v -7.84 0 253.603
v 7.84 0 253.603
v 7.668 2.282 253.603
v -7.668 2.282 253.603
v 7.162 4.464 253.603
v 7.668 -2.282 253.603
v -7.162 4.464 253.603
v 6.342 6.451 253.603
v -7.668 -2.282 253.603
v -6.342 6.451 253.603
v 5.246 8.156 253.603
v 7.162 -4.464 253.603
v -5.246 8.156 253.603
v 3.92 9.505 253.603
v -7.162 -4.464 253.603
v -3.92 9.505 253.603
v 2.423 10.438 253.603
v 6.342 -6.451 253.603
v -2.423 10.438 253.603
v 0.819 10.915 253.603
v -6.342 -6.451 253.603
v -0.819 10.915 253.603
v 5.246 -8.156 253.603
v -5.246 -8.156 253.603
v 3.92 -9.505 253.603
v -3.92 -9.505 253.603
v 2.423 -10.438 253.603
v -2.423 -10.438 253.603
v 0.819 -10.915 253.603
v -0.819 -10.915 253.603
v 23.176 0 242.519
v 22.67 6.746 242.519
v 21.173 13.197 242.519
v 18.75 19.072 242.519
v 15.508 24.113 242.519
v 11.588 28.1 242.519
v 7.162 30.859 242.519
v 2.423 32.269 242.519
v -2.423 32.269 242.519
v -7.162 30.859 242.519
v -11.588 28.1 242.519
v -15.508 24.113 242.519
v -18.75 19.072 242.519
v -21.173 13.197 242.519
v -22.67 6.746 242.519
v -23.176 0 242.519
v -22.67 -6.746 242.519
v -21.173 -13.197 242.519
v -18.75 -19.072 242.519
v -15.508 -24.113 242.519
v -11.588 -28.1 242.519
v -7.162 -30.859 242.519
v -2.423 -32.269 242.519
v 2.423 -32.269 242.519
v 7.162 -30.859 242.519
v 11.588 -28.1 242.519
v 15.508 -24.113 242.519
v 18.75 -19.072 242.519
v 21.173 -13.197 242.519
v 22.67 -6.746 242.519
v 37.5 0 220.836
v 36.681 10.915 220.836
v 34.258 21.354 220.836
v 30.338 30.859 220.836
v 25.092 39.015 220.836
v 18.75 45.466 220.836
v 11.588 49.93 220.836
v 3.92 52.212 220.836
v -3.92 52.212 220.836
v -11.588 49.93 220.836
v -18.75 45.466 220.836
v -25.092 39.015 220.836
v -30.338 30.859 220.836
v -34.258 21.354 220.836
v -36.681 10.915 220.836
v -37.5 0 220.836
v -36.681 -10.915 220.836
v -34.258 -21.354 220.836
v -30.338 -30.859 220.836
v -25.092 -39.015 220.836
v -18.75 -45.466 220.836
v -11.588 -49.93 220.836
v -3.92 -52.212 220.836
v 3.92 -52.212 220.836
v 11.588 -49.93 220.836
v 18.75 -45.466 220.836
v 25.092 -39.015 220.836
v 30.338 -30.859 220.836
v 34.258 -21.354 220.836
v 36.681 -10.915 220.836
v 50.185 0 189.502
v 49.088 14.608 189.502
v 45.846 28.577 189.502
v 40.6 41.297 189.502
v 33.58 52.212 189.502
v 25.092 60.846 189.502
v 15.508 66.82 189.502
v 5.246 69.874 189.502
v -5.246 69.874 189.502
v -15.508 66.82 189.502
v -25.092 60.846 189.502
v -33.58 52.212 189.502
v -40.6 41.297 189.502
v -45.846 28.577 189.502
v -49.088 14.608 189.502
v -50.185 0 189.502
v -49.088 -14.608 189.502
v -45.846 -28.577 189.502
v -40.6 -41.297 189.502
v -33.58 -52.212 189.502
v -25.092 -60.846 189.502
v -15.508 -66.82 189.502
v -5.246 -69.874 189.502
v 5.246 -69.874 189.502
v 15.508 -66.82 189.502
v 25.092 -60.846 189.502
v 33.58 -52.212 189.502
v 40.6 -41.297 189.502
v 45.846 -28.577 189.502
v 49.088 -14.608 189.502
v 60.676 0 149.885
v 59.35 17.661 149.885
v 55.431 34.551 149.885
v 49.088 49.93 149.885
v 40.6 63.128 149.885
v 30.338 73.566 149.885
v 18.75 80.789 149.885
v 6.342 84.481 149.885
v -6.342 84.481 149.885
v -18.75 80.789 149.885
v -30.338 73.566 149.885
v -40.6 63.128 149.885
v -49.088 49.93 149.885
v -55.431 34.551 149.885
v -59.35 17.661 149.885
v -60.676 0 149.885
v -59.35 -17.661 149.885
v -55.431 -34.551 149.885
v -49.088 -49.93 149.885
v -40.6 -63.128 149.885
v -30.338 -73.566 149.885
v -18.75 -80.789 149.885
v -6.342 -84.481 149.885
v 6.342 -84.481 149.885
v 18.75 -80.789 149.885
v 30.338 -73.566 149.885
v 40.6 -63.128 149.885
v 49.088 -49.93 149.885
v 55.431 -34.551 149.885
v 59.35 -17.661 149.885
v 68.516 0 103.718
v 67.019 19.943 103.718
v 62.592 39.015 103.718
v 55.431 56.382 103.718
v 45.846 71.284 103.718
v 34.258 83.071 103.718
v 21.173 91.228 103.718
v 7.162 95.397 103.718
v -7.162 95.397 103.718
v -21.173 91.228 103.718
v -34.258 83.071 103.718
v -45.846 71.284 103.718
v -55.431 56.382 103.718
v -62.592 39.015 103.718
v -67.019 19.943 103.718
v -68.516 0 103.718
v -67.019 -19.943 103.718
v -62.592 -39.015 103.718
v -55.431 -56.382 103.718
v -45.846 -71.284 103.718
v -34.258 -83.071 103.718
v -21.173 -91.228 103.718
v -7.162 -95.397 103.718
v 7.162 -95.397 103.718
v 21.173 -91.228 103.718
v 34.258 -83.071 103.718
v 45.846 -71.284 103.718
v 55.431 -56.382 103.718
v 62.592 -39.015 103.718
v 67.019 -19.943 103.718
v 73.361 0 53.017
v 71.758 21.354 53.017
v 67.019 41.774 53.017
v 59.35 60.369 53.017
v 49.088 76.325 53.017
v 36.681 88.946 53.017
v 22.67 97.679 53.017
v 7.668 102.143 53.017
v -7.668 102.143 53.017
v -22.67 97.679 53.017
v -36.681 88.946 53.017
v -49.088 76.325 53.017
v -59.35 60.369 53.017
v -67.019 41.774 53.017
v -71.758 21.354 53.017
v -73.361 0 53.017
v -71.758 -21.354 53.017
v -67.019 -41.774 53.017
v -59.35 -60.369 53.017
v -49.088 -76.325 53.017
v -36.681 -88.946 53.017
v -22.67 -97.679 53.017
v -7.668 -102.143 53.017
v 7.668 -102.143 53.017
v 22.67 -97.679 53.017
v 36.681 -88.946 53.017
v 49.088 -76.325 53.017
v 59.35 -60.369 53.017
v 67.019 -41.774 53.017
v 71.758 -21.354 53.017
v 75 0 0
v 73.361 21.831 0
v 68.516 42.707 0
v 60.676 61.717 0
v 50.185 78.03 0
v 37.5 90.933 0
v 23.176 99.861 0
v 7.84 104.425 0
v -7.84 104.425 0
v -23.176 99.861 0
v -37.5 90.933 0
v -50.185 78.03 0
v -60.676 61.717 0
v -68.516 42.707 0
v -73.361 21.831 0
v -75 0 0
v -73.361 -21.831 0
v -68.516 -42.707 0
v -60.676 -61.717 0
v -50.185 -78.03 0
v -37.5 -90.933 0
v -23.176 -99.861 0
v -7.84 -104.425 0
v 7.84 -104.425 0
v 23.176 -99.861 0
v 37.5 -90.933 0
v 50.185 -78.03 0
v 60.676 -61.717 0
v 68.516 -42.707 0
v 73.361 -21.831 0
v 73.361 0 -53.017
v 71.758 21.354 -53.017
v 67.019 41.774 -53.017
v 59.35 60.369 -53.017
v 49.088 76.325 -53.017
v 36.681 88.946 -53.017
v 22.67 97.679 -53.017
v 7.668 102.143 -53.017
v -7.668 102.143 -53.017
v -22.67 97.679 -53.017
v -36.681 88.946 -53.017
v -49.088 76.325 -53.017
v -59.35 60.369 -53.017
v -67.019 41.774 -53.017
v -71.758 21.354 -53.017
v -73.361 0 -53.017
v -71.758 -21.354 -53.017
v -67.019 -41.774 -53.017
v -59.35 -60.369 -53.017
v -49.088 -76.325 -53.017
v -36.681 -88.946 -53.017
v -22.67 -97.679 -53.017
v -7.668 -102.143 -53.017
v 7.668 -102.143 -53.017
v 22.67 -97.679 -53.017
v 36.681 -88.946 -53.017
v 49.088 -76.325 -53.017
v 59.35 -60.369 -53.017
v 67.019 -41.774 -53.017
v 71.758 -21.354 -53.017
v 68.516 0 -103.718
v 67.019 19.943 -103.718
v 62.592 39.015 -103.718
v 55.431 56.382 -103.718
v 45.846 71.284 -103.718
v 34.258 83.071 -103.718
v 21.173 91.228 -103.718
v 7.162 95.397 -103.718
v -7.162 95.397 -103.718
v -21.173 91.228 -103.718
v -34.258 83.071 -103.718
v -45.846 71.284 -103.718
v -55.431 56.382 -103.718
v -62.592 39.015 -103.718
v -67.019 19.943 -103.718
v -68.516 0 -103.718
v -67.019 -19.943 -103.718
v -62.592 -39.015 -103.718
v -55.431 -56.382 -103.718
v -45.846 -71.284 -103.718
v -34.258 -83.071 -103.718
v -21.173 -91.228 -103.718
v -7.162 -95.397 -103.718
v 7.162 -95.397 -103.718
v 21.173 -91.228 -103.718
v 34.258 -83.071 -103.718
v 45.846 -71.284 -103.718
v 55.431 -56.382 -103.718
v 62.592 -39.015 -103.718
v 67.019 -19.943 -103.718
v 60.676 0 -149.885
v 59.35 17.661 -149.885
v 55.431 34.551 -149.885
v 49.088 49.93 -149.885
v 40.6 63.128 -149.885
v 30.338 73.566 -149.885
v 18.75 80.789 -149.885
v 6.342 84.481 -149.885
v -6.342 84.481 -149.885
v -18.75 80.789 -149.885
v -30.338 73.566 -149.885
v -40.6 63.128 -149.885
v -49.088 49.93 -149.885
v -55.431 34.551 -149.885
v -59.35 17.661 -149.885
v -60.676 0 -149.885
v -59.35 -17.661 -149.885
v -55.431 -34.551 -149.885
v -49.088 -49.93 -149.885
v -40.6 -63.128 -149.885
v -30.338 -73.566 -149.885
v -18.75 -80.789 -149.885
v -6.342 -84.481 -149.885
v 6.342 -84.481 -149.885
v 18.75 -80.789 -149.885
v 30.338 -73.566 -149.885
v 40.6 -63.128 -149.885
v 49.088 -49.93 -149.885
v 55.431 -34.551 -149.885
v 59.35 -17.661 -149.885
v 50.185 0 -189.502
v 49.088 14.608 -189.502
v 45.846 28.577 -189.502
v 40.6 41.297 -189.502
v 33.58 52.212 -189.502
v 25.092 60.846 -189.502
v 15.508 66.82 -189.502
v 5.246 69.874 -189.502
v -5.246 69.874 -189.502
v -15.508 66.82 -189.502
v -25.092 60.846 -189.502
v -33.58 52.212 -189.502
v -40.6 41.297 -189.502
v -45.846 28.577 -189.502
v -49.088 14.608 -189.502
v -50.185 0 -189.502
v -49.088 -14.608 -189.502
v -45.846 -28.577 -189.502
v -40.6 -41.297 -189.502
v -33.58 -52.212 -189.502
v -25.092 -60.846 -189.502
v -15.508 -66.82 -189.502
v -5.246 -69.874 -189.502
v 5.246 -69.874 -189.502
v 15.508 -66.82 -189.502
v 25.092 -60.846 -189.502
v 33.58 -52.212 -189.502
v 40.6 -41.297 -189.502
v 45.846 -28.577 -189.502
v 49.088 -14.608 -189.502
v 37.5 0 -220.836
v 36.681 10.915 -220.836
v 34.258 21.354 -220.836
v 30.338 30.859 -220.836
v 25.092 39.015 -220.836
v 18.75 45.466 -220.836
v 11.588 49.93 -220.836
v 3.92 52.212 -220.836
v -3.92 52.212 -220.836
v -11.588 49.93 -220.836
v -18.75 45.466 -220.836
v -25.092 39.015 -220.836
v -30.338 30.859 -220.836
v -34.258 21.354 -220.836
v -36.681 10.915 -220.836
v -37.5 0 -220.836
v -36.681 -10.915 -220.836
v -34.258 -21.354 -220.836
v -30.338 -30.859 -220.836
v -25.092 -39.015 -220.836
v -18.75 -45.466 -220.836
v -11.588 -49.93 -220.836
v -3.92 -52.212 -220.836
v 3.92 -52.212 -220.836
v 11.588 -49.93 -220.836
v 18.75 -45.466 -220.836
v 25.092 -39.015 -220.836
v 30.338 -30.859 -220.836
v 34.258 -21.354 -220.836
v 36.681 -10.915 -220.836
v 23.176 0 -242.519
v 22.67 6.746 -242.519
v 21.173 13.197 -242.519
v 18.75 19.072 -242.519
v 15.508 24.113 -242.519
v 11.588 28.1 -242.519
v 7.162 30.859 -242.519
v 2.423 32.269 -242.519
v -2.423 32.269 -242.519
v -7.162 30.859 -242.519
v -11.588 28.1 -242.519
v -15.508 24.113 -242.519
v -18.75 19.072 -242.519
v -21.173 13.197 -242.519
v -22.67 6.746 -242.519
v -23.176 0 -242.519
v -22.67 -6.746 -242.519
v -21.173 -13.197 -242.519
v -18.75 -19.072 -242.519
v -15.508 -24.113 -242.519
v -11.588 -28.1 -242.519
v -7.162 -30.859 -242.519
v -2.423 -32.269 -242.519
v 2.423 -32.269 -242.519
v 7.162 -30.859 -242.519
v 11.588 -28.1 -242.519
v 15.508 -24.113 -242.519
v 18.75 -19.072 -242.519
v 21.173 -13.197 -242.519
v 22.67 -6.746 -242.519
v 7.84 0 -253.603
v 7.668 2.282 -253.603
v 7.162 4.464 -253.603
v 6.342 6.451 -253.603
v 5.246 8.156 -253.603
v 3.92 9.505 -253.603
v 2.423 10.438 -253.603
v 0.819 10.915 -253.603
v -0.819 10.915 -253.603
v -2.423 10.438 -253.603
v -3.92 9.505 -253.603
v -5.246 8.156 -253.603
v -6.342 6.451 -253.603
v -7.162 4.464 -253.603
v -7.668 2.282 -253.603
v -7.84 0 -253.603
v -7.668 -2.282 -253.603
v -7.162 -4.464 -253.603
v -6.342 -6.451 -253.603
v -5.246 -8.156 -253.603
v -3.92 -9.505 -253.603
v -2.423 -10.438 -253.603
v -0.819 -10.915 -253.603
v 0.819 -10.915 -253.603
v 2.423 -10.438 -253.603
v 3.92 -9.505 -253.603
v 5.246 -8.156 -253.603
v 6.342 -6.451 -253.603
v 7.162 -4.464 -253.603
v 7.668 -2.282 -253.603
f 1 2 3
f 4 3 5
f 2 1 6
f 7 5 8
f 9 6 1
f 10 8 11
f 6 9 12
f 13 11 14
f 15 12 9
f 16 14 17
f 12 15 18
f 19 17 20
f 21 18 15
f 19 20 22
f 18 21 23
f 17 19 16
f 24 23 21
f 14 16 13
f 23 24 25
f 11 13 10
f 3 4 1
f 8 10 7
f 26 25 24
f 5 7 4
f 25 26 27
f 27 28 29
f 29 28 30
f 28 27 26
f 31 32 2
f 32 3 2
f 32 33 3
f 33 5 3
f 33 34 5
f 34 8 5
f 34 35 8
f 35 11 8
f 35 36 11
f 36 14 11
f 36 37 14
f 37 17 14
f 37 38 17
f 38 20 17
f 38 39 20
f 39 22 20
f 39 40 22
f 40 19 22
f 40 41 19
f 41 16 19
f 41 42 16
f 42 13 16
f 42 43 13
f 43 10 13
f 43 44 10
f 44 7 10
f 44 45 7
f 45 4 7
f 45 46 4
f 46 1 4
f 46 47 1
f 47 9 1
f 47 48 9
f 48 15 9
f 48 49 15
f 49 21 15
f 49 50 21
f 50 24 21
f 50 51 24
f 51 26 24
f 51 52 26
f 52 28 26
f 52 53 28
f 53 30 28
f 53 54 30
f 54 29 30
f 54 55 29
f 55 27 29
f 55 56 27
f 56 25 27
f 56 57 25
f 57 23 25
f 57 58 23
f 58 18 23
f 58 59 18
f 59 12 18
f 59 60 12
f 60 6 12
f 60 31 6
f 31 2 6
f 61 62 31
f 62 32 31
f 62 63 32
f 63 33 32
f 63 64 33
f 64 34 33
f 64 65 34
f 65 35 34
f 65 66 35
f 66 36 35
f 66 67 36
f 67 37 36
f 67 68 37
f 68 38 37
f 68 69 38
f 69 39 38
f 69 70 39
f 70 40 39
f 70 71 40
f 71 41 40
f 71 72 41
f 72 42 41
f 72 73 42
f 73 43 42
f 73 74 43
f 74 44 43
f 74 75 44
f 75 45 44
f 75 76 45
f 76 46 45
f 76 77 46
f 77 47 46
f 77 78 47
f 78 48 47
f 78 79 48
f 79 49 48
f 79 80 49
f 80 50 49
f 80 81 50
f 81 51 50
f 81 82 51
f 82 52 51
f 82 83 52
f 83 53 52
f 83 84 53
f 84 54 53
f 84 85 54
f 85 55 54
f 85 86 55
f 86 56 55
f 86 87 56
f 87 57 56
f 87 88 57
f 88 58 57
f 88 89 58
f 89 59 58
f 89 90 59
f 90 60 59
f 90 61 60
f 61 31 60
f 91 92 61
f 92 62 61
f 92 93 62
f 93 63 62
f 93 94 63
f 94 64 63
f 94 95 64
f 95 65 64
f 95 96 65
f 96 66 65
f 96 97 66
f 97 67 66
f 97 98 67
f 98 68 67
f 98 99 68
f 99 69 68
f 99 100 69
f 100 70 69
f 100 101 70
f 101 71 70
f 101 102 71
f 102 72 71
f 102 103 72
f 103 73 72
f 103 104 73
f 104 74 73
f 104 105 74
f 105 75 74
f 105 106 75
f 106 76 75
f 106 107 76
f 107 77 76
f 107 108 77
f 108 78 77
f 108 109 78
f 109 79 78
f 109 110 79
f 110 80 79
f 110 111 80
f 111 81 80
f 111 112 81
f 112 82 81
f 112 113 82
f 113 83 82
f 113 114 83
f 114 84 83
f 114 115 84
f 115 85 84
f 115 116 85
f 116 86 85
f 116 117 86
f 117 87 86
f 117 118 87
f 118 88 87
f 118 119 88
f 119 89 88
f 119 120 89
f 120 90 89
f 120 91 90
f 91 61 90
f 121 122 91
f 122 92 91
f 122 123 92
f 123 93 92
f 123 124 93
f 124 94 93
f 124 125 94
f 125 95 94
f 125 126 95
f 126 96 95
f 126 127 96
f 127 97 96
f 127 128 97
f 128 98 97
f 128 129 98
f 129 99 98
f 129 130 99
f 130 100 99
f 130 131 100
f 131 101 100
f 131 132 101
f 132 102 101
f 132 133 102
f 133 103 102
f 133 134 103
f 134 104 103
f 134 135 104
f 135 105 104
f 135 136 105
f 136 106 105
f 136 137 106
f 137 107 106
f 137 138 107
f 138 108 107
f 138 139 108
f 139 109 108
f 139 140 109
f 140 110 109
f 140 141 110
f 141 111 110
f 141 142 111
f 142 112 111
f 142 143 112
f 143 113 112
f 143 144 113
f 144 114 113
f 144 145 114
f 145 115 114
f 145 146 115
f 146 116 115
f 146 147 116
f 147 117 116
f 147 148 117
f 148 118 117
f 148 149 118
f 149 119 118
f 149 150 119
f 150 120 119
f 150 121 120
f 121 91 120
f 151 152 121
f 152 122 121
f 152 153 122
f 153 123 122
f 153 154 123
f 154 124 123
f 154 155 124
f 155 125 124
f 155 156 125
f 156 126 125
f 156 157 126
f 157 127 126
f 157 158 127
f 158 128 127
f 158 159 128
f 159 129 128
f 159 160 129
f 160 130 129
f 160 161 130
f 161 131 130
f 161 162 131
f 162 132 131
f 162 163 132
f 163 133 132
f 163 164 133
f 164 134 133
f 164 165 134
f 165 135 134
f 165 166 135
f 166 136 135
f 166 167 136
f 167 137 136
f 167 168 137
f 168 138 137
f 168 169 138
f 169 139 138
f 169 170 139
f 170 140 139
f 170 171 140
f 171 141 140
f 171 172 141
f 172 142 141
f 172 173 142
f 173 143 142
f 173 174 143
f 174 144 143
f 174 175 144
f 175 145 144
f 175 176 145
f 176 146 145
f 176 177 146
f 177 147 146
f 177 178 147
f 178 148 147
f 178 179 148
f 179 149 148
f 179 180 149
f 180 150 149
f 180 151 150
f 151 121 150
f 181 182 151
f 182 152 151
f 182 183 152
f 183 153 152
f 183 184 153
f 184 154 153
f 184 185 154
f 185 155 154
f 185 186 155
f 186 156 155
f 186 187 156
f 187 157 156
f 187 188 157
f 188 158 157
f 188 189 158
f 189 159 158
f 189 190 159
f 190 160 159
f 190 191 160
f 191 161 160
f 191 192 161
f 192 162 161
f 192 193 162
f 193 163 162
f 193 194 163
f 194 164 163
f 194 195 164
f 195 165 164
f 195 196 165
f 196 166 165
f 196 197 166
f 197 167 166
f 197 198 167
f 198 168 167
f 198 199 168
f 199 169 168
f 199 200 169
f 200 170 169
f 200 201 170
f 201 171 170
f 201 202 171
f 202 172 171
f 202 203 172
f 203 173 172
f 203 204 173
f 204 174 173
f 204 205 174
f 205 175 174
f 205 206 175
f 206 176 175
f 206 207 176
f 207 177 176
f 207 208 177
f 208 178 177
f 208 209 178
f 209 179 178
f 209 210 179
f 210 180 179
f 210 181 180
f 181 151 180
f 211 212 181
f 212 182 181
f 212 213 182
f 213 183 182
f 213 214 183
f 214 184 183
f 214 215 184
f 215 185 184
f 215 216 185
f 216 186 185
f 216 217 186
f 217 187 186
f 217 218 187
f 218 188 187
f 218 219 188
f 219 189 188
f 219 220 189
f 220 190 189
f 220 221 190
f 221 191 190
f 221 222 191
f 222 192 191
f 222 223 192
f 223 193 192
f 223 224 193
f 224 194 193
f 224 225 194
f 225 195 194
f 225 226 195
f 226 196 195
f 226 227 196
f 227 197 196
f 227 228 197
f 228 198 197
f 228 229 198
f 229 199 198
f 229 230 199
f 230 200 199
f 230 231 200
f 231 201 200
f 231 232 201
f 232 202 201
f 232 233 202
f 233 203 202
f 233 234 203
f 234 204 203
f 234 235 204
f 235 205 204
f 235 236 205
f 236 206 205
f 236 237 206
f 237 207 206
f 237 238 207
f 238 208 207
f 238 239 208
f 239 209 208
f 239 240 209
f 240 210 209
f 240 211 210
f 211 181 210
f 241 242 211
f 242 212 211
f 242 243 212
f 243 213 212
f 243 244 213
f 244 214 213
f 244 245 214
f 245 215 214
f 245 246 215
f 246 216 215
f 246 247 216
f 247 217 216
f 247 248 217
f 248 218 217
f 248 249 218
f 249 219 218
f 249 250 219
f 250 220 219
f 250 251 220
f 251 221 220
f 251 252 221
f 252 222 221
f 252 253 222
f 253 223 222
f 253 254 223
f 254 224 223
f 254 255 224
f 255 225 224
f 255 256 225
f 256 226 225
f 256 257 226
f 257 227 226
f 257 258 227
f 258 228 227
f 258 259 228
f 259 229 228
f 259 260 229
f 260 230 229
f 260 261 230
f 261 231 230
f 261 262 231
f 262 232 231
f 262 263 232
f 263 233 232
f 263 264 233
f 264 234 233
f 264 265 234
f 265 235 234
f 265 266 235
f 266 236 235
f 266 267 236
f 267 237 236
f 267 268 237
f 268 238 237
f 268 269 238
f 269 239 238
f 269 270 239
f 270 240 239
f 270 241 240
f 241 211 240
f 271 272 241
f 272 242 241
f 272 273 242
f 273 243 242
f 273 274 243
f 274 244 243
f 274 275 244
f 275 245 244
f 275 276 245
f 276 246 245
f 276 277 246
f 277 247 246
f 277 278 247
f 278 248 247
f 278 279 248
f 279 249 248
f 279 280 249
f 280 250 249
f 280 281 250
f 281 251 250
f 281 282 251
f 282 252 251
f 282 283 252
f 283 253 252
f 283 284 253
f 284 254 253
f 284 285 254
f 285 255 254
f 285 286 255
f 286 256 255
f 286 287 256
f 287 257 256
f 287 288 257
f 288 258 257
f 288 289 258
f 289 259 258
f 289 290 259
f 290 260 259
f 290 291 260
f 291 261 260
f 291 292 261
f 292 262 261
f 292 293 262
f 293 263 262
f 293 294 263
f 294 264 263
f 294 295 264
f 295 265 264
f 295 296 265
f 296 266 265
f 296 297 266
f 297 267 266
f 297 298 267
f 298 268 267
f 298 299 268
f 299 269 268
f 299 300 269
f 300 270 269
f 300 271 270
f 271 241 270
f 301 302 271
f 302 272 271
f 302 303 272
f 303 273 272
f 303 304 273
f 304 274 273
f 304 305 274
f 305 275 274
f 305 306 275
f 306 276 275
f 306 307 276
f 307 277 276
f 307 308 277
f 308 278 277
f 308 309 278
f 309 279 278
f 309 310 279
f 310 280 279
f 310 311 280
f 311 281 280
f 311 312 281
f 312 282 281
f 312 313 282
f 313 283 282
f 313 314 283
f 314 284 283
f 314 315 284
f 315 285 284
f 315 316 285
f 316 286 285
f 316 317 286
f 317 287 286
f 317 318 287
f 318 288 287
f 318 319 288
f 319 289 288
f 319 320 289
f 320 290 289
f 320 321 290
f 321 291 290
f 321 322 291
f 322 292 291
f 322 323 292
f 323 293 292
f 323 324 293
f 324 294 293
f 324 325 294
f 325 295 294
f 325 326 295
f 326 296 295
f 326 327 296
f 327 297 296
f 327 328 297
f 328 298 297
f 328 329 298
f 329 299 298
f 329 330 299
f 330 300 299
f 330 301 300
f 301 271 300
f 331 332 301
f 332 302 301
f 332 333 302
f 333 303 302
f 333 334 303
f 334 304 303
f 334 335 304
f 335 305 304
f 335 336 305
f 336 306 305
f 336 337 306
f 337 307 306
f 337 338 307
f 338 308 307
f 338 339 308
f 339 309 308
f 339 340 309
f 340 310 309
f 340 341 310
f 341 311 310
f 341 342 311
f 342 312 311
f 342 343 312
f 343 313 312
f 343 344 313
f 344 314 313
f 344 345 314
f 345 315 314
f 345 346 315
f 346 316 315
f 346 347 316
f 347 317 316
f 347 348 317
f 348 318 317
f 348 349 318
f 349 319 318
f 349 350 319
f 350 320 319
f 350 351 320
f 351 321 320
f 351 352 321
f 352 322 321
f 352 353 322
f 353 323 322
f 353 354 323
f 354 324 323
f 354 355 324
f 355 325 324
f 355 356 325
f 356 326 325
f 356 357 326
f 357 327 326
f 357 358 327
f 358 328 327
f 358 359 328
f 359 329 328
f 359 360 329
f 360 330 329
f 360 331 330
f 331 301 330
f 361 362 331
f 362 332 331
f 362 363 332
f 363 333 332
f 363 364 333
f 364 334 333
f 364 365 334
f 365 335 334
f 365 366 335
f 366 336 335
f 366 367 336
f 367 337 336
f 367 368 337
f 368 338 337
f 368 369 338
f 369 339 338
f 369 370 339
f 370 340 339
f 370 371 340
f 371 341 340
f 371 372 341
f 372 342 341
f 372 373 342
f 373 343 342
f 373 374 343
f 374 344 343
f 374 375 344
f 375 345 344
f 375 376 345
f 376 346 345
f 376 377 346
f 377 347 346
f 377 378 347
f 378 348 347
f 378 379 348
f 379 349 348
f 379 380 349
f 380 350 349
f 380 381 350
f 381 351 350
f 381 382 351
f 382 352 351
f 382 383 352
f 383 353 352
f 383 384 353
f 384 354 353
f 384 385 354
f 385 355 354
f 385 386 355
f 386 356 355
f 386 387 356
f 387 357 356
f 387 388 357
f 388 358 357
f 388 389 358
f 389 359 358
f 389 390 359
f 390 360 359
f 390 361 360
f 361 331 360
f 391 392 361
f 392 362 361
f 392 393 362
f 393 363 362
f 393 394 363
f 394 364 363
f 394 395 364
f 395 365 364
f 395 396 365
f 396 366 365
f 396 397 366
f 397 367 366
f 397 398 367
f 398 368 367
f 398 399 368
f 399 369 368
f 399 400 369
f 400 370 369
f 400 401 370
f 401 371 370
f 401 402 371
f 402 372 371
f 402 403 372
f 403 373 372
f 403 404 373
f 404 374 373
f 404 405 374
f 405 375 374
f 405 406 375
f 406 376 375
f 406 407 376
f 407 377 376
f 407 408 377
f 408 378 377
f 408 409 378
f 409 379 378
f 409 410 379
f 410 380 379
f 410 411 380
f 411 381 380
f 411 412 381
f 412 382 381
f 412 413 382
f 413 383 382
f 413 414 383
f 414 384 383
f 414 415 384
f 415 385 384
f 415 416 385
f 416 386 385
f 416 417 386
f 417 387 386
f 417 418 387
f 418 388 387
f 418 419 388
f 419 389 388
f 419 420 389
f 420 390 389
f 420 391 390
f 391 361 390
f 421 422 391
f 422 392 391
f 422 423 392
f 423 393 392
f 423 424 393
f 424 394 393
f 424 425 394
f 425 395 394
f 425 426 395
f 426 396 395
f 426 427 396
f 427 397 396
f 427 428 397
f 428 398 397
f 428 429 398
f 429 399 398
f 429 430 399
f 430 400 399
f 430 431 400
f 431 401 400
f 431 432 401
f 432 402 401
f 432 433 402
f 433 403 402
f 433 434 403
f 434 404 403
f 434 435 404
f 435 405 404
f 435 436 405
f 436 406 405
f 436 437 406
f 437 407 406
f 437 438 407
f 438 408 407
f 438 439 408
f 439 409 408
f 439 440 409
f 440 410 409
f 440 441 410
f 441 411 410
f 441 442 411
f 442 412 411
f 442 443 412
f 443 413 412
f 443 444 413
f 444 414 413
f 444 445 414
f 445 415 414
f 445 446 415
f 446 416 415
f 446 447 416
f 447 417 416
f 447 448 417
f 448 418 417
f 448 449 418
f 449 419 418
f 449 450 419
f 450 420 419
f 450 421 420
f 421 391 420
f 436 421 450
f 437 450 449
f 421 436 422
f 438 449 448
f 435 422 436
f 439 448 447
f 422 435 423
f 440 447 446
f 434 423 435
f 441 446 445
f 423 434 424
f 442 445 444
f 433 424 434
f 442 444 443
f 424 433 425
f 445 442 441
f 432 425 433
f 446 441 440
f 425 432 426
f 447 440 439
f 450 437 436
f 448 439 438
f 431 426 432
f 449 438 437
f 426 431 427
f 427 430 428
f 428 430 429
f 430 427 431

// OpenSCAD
// Generated by SolidPython 1.0.1 on 2020-07-29 00:46:46


scale(v = [5, 7, 17]) {
	sphere(r = 15);
}
/***********************************************
*********      SolidPython code:      **********
************************************************
 
# import packages: SolidPython
from solid import *
from solid.utils import *
from itertools import chain, combinations, permutations


class Resize:

    def __init__(self, scad_file):
        self.scad_file = scad_file
        #self.scad_file = import_scad(scad_file)
        # cone/cylinder param:
        self.r1 = 0
        self.r2 = 0
        self.h = 0
        # rectangular prism param:
        self.w = 0
        self.l = 0
        # ellipse param:
        self.r = 0

    # import OpenScad code (file name corresponds to shape)


    # classify shape + parameters
    def assign(self, param1, param2, param3):
        if self.scad_file == 'cone.scad':
            self.r1 = param1
            self.r2 = param2
            self.h = param3
        elif self.scad_file == 'cylinder.scad':
            self.r1 = param1
            self.r2 = param2
            self.h = param3
        elif self.scad_file == 'rectangularPrism.scad':
            self.h = param1
            self.l = param2
            self.w = param3
        else:
            self.r = param1
            self.h = param2

    # resize parameters
    def iterate(self):
        x = range(3, 20, 2)
        i = 1
        if self.scad_file == 'cone.scad':
            tempList = list(permutations(x, 2))
            for temp in tempList:
                param1 = temp[0]
                param2 = temp[1]
                filepath = 'produced_scad_files/' + 'cone' + str(param1) + '_' + str(param2) + '_' + '.scad'
                scad_render_to_file(cylinder(h=param1, r1=param2, r2=0), filepath)

        elif self.scad_file == 'cylinder.scad':
            tempList = list(permutations(x, 3))
            for temp in tempList:
                param1 = temp[0]
                param2 = temp[1]
                filepath = 'produced_scad_files/' + 'cylinder' + str(param1) + '_' + str(param2) + '_' + '.scad'
                scad_render_to_file(cylinder(h=param1, r1=param2, r2=param2), filepath)

        elif self.scad_file == 'rectangularPrism.scad':
            tempList = list(permutations(x, 3))
            for temp in tempList:
                param1 = temp[0]
                param2 = temp[1]
                param3 = temp[2]
                filepath = 'produced_scad_files/' + 'rectangularPrism' + str(param1) + '_' + str(param2) + '_' + str(
                    param3) + '.scad'
                scad_render_to_file(cube(size=(param1, param2, param3)), filepath)

        elif self.scad_file == 'ellipse.scad':
            tempList = list(permutations(x, 4))
            for temp in tempList:
                param1 = temp[0]
                param2 = temp[1]
                param3 = temp[2]
                param4 = temp[3]
                filepath = 'produced_scad_files/' + 'ellipse' + str(param1) + '_' + str(param2) + '_' + str(param3) + '_' + str(param4) + '.scad'
                scad_render_to_file(scale([param1, param2, param3])(sphere(r=param4)), filepath)

    def render_to_scadfile(self):
        scad_render_to_file(scad, 'example.scad') 
 
************************************************/
